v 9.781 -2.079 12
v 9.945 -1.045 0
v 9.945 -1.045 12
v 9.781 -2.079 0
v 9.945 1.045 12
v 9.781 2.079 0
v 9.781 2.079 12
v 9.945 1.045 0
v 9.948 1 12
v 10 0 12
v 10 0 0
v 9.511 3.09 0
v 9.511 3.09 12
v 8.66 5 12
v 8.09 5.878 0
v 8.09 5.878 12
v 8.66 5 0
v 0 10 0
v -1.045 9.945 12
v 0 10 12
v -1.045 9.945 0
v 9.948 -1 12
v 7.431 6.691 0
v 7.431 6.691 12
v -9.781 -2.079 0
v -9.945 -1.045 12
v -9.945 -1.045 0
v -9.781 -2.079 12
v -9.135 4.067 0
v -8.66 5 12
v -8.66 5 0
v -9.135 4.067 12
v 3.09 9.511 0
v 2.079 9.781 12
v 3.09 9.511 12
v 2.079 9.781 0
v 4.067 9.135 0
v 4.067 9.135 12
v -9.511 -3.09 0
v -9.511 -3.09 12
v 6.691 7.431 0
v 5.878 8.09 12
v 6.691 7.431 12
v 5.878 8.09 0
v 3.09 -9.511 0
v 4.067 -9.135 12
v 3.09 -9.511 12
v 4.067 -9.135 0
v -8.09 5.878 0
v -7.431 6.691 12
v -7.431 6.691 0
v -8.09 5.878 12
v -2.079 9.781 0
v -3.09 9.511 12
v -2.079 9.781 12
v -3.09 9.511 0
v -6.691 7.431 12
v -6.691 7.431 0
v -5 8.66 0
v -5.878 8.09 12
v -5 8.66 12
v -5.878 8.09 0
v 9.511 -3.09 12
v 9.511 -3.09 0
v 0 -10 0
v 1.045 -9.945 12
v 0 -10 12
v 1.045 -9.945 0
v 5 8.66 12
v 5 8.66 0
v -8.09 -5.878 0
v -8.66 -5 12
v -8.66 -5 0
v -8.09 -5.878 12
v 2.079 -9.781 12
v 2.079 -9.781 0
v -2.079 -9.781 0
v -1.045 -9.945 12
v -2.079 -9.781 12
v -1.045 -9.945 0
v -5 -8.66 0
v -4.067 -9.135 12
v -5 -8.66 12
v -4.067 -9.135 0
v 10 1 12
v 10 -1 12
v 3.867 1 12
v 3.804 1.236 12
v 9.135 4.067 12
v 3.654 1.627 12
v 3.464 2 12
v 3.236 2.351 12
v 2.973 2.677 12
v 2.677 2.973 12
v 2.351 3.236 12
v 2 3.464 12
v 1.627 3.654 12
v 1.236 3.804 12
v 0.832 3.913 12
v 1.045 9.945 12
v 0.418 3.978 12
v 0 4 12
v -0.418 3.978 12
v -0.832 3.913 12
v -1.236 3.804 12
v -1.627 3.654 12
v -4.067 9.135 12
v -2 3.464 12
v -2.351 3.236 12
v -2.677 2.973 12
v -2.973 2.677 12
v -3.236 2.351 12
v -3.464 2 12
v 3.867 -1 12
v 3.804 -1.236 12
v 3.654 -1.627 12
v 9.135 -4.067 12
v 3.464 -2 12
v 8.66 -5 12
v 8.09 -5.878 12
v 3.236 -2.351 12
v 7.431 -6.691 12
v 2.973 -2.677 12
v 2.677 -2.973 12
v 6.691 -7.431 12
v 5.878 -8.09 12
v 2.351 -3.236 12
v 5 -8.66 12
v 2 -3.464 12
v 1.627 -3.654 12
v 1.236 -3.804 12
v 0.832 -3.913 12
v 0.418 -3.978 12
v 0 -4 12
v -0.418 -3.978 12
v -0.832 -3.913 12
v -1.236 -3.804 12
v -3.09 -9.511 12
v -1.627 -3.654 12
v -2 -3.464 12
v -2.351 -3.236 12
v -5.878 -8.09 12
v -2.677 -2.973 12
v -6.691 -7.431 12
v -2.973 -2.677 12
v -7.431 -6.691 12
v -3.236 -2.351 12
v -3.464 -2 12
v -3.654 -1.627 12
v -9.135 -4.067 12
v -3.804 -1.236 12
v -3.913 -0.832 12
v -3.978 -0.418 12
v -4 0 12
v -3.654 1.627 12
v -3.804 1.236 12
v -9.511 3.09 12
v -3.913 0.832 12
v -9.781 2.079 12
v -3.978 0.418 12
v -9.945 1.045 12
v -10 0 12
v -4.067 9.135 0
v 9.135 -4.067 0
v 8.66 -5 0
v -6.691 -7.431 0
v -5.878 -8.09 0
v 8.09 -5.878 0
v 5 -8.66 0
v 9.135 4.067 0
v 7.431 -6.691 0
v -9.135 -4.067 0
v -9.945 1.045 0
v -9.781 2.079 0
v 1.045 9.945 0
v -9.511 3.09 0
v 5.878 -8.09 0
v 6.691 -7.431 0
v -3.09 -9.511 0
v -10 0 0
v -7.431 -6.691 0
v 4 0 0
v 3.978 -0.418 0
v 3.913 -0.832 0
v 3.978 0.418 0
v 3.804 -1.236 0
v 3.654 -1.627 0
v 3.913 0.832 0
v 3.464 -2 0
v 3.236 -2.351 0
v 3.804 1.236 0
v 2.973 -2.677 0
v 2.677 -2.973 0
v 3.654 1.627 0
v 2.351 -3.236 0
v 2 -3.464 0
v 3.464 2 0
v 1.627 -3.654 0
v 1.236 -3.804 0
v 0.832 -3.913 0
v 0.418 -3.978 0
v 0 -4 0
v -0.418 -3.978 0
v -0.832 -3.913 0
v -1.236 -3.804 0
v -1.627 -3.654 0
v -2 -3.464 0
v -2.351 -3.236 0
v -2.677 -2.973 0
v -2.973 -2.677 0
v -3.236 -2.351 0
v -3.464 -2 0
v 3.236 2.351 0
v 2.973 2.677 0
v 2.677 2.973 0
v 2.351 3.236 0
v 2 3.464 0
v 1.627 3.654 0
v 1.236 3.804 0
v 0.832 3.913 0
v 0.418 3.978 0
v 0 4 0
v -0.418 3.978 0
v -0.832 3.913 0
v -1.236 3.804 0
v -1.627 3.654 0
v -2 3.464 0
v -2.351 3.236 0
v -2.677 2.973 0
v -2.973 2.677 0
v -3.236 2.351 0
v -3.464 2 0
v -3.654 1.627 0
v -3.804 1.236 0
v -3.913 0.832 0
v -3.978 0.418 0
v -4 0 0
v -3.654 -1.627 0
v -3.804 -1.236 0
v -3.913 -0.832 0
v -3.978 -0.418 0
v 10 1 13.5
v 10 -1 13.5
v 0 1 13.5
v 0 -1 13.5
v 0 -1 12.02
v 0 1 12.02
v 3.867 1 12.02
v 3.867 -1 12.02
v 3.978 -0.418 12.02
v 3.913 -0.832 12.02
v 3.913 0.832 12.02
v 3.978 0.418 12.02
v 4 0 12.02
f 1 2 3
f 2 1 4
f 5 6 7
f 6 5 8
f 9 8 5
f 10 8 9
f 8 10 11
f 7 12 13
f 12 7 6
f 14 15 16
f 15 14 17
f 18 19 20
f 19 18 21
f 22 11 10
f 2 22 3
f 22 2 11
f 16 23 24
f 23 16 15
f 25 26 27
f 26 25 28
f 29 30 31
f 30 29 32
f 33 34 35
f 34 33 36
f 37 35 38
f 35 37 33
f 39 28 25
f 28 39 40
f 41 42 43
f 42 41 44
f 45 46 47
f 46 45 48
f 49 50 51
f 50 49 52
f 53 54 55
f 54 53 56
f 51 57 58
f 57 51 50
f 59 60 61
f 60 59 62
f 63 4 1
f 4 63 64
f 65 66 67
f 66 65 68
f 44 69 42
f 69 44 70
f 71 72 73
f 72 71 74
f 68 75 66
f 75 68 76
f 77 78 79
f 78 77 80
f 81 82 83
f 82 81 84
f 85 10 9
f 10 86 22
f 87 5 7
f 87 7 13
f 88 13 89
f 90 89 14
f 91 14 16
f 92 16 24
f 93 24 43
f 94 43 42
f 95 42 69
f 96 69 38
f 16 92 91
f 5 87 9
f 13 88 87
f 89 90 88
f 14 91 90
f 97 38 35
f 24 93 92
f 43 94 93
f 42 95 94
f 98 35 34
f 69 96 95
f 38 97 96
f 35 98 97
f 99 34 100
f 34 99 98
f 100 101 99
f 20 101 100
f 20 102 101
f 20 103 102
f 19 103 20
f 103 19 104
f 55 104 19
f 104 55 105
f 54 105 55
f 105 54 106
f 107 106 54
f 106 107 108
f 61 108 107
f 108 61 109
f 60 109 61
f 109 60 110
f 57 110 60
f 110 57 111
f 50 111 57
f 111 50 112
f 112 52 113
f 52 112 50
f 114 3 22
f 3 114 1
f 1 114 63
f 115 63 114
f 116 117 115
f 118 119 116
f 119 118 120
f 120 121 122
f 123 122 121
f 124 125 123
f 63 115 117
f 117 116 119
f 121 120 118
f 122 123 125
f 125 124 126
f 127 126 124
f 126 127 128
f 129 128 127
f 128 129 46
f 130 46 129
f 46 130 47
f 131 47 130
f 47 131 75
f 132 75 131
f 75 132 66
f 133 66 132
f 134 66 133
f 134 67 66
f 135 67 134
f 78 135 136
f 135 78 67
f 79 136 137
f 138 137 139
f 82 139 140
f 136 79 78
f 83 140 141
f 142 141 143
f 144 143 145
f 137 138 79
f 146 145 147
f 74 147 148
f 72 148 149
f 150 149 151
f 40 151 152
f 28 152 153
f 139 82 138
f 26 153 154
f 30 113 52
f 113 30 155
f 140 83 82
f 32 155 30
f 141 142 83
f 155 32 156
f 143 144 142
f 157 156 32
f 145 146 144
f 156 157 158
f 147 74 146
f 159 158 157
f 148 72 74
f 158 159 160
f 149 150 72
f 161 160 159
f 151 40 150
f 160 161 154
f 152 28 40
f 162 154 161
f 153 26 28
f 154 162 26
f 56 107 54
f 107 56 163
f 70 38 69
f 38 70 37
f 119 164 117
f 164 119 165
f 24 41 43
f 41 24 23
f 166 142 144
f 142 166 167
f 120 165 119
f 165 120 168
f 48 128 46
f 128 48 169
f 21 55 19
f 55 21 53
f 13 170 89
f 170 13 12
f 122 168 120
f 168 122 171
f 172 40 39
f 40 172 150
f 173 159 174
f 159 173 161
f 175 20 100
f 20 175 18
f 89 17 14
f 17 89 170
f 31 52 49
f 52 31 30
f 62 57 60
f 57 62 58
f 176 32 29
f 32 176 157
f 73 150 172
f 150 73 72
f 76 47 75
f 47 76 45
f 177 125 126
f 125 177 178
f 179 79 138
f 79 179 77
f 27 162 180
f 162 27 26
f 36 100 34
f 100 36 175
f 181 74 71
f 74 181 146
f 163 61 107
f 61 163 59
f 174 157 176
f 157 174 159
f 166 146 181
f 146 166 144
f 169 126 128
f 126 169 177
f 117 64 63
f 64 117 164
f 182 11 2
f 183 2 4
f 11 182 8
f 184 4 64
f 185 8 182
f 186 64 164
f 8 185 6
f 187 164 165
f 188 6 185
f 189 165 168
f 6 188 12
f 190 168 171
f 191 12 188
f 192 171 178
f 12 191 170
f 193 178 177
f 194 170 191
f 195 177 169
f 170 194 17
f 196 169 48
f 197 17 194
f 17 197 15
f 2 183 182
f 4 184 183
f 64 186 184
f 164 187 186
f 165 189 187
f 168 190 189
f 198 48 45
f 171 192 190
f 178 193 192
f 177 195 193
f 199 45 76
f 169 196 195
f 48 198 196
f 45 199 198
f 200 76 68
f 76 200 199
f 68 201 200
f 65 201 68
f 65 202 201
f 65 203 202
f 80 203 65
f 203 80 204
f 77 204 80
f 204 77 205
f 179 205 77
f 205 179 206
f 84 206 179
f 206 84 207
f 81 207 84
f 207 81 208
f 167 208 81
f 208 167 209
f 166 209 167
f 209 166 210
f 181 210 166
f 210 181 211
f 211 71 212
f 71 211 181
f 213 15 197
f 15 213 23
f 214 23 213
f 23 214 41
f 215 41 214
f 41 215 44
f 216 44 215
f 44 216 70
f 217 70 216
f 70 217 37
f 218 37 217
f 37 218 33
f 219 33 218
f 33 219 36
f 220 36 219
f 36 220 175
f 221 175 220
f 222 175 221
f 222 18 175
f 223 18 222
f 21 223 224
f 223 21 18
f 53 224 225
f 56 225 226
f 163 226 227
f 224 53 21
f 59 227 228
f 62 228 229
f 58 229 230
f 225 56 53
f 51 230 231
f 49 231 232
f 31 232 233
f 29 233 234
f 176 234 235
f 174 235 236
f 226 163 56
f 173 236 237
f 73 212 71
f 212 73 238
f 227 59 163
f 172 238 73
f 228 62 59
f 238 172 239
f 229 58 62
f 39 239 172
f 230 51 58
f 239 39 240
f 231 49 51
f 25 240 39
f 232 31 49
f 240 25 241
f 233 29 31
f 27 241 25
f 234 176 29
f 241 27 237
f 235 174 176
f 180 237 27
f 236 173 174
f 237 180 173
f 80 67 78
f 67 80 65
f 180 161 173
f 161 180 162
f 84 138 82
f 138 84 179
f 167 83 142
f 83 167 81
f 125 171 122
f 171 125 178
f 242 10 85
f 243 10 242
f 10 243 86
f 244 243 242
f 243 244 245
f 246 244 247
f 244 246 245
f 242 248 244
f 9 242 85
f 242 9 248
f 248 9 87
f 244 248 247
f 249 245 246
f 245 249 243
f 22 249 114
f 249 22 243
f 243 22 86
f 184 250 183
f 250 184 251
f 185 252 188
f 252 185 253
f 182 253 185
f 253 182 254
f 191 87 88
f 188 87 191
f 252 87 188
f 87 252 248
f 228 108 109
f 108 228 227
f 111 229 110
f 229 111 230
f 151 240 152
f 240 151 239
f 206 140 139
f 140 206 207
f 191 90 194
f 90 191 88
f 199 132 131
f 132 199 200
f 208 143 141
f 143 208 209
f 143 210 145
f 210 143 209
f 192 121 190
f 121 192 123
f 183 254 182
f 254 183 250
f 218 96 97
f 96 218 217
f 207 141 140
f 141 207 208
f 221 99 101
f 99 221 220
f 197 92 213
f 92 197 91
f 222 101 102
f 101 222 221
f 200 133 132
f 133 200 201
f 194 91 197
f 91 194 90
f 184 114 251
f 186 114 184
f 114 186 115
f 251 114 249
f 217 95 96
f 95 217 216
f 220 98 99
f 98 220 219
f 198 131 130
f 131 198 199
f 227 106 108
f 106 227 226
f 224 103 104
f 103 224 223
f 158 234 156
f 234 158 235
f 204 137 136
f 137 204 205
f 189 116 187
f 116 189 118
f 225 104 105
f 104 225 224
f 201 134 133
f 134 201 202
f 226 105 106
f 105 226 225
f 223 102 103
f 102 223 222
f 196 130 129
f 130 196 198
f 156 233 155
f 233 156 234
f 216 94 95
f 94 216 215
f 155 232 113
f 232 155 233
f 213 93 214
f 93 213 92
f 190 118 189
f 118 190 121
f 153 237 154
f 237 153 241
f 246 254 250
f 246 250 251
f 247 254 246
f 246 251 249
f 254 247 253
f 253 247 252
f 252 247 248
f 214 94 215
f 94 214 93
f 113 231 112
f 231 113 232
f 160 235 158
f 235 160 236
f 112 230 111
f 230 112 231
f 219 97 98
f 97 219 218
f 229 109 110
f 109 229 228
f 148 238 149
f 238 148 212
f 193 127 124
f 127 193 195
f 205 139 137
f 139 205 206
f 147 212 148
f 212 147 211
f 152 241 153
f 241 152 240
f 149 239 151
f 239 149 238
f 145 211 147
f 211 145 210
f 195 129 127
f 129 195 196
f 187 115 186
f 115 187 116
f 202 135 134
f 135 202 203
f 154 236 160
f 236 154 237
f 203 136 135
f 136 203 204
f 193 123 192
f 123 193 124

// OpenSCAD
// Pointer control knob.
$fn = 60;
eps = 0.02;
bore_d = 8;
knob_d = 20;
knob_h = 12;
difference() { union() { cylinder(d=knob_d,h=knob_h); translate([0,-1,knob_h]) cube([knob_d/2,2,1.5]); } translate([0,0,-eps]) cylinder(d=bore_d,h=knob_h+2*eps); }
